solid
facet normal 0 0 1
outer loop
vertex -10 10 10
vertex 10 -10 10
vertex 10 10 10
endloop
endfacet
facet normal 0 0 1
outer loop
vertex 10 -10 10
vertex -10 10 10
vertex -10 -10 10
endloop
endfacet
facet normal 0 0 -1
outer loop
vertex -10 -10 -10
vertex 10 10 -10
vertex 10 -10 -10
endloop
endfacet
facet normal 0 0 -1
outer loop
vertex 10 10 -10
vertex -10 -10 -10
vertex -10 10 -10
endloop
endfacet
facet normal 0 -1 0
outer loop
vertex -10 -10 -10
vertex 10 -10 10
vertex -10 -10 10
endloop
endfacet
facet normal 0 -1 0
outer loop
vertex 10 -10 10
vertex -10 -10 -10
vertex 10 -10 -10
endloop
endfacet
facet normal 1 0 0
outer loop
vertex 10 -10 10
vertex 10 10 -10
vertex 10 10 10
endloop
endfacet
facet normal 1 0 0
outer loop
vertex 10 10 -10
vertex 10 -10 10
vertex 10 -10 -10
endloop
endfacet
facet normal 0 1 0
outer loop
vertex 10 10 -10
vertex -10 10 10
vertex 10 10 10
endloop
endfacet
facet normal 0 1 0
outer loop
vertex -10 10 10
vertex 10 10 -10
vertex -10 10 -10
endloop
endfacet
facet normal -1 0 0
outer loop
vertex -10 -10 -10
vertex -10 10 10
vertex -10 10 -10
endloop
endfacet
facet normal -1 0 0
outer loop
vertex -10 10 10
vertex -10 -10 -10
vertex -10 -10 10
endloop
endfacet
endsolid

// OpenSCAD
// Adversarial: one solid wearing both selectors.
// If `distinct-exported-parts` only compared exported file names or selector
// strings this would score; it compares the solids.
agentscad_part = "all";
$fn = 32;

cube([20, 20, 20], center = true);
